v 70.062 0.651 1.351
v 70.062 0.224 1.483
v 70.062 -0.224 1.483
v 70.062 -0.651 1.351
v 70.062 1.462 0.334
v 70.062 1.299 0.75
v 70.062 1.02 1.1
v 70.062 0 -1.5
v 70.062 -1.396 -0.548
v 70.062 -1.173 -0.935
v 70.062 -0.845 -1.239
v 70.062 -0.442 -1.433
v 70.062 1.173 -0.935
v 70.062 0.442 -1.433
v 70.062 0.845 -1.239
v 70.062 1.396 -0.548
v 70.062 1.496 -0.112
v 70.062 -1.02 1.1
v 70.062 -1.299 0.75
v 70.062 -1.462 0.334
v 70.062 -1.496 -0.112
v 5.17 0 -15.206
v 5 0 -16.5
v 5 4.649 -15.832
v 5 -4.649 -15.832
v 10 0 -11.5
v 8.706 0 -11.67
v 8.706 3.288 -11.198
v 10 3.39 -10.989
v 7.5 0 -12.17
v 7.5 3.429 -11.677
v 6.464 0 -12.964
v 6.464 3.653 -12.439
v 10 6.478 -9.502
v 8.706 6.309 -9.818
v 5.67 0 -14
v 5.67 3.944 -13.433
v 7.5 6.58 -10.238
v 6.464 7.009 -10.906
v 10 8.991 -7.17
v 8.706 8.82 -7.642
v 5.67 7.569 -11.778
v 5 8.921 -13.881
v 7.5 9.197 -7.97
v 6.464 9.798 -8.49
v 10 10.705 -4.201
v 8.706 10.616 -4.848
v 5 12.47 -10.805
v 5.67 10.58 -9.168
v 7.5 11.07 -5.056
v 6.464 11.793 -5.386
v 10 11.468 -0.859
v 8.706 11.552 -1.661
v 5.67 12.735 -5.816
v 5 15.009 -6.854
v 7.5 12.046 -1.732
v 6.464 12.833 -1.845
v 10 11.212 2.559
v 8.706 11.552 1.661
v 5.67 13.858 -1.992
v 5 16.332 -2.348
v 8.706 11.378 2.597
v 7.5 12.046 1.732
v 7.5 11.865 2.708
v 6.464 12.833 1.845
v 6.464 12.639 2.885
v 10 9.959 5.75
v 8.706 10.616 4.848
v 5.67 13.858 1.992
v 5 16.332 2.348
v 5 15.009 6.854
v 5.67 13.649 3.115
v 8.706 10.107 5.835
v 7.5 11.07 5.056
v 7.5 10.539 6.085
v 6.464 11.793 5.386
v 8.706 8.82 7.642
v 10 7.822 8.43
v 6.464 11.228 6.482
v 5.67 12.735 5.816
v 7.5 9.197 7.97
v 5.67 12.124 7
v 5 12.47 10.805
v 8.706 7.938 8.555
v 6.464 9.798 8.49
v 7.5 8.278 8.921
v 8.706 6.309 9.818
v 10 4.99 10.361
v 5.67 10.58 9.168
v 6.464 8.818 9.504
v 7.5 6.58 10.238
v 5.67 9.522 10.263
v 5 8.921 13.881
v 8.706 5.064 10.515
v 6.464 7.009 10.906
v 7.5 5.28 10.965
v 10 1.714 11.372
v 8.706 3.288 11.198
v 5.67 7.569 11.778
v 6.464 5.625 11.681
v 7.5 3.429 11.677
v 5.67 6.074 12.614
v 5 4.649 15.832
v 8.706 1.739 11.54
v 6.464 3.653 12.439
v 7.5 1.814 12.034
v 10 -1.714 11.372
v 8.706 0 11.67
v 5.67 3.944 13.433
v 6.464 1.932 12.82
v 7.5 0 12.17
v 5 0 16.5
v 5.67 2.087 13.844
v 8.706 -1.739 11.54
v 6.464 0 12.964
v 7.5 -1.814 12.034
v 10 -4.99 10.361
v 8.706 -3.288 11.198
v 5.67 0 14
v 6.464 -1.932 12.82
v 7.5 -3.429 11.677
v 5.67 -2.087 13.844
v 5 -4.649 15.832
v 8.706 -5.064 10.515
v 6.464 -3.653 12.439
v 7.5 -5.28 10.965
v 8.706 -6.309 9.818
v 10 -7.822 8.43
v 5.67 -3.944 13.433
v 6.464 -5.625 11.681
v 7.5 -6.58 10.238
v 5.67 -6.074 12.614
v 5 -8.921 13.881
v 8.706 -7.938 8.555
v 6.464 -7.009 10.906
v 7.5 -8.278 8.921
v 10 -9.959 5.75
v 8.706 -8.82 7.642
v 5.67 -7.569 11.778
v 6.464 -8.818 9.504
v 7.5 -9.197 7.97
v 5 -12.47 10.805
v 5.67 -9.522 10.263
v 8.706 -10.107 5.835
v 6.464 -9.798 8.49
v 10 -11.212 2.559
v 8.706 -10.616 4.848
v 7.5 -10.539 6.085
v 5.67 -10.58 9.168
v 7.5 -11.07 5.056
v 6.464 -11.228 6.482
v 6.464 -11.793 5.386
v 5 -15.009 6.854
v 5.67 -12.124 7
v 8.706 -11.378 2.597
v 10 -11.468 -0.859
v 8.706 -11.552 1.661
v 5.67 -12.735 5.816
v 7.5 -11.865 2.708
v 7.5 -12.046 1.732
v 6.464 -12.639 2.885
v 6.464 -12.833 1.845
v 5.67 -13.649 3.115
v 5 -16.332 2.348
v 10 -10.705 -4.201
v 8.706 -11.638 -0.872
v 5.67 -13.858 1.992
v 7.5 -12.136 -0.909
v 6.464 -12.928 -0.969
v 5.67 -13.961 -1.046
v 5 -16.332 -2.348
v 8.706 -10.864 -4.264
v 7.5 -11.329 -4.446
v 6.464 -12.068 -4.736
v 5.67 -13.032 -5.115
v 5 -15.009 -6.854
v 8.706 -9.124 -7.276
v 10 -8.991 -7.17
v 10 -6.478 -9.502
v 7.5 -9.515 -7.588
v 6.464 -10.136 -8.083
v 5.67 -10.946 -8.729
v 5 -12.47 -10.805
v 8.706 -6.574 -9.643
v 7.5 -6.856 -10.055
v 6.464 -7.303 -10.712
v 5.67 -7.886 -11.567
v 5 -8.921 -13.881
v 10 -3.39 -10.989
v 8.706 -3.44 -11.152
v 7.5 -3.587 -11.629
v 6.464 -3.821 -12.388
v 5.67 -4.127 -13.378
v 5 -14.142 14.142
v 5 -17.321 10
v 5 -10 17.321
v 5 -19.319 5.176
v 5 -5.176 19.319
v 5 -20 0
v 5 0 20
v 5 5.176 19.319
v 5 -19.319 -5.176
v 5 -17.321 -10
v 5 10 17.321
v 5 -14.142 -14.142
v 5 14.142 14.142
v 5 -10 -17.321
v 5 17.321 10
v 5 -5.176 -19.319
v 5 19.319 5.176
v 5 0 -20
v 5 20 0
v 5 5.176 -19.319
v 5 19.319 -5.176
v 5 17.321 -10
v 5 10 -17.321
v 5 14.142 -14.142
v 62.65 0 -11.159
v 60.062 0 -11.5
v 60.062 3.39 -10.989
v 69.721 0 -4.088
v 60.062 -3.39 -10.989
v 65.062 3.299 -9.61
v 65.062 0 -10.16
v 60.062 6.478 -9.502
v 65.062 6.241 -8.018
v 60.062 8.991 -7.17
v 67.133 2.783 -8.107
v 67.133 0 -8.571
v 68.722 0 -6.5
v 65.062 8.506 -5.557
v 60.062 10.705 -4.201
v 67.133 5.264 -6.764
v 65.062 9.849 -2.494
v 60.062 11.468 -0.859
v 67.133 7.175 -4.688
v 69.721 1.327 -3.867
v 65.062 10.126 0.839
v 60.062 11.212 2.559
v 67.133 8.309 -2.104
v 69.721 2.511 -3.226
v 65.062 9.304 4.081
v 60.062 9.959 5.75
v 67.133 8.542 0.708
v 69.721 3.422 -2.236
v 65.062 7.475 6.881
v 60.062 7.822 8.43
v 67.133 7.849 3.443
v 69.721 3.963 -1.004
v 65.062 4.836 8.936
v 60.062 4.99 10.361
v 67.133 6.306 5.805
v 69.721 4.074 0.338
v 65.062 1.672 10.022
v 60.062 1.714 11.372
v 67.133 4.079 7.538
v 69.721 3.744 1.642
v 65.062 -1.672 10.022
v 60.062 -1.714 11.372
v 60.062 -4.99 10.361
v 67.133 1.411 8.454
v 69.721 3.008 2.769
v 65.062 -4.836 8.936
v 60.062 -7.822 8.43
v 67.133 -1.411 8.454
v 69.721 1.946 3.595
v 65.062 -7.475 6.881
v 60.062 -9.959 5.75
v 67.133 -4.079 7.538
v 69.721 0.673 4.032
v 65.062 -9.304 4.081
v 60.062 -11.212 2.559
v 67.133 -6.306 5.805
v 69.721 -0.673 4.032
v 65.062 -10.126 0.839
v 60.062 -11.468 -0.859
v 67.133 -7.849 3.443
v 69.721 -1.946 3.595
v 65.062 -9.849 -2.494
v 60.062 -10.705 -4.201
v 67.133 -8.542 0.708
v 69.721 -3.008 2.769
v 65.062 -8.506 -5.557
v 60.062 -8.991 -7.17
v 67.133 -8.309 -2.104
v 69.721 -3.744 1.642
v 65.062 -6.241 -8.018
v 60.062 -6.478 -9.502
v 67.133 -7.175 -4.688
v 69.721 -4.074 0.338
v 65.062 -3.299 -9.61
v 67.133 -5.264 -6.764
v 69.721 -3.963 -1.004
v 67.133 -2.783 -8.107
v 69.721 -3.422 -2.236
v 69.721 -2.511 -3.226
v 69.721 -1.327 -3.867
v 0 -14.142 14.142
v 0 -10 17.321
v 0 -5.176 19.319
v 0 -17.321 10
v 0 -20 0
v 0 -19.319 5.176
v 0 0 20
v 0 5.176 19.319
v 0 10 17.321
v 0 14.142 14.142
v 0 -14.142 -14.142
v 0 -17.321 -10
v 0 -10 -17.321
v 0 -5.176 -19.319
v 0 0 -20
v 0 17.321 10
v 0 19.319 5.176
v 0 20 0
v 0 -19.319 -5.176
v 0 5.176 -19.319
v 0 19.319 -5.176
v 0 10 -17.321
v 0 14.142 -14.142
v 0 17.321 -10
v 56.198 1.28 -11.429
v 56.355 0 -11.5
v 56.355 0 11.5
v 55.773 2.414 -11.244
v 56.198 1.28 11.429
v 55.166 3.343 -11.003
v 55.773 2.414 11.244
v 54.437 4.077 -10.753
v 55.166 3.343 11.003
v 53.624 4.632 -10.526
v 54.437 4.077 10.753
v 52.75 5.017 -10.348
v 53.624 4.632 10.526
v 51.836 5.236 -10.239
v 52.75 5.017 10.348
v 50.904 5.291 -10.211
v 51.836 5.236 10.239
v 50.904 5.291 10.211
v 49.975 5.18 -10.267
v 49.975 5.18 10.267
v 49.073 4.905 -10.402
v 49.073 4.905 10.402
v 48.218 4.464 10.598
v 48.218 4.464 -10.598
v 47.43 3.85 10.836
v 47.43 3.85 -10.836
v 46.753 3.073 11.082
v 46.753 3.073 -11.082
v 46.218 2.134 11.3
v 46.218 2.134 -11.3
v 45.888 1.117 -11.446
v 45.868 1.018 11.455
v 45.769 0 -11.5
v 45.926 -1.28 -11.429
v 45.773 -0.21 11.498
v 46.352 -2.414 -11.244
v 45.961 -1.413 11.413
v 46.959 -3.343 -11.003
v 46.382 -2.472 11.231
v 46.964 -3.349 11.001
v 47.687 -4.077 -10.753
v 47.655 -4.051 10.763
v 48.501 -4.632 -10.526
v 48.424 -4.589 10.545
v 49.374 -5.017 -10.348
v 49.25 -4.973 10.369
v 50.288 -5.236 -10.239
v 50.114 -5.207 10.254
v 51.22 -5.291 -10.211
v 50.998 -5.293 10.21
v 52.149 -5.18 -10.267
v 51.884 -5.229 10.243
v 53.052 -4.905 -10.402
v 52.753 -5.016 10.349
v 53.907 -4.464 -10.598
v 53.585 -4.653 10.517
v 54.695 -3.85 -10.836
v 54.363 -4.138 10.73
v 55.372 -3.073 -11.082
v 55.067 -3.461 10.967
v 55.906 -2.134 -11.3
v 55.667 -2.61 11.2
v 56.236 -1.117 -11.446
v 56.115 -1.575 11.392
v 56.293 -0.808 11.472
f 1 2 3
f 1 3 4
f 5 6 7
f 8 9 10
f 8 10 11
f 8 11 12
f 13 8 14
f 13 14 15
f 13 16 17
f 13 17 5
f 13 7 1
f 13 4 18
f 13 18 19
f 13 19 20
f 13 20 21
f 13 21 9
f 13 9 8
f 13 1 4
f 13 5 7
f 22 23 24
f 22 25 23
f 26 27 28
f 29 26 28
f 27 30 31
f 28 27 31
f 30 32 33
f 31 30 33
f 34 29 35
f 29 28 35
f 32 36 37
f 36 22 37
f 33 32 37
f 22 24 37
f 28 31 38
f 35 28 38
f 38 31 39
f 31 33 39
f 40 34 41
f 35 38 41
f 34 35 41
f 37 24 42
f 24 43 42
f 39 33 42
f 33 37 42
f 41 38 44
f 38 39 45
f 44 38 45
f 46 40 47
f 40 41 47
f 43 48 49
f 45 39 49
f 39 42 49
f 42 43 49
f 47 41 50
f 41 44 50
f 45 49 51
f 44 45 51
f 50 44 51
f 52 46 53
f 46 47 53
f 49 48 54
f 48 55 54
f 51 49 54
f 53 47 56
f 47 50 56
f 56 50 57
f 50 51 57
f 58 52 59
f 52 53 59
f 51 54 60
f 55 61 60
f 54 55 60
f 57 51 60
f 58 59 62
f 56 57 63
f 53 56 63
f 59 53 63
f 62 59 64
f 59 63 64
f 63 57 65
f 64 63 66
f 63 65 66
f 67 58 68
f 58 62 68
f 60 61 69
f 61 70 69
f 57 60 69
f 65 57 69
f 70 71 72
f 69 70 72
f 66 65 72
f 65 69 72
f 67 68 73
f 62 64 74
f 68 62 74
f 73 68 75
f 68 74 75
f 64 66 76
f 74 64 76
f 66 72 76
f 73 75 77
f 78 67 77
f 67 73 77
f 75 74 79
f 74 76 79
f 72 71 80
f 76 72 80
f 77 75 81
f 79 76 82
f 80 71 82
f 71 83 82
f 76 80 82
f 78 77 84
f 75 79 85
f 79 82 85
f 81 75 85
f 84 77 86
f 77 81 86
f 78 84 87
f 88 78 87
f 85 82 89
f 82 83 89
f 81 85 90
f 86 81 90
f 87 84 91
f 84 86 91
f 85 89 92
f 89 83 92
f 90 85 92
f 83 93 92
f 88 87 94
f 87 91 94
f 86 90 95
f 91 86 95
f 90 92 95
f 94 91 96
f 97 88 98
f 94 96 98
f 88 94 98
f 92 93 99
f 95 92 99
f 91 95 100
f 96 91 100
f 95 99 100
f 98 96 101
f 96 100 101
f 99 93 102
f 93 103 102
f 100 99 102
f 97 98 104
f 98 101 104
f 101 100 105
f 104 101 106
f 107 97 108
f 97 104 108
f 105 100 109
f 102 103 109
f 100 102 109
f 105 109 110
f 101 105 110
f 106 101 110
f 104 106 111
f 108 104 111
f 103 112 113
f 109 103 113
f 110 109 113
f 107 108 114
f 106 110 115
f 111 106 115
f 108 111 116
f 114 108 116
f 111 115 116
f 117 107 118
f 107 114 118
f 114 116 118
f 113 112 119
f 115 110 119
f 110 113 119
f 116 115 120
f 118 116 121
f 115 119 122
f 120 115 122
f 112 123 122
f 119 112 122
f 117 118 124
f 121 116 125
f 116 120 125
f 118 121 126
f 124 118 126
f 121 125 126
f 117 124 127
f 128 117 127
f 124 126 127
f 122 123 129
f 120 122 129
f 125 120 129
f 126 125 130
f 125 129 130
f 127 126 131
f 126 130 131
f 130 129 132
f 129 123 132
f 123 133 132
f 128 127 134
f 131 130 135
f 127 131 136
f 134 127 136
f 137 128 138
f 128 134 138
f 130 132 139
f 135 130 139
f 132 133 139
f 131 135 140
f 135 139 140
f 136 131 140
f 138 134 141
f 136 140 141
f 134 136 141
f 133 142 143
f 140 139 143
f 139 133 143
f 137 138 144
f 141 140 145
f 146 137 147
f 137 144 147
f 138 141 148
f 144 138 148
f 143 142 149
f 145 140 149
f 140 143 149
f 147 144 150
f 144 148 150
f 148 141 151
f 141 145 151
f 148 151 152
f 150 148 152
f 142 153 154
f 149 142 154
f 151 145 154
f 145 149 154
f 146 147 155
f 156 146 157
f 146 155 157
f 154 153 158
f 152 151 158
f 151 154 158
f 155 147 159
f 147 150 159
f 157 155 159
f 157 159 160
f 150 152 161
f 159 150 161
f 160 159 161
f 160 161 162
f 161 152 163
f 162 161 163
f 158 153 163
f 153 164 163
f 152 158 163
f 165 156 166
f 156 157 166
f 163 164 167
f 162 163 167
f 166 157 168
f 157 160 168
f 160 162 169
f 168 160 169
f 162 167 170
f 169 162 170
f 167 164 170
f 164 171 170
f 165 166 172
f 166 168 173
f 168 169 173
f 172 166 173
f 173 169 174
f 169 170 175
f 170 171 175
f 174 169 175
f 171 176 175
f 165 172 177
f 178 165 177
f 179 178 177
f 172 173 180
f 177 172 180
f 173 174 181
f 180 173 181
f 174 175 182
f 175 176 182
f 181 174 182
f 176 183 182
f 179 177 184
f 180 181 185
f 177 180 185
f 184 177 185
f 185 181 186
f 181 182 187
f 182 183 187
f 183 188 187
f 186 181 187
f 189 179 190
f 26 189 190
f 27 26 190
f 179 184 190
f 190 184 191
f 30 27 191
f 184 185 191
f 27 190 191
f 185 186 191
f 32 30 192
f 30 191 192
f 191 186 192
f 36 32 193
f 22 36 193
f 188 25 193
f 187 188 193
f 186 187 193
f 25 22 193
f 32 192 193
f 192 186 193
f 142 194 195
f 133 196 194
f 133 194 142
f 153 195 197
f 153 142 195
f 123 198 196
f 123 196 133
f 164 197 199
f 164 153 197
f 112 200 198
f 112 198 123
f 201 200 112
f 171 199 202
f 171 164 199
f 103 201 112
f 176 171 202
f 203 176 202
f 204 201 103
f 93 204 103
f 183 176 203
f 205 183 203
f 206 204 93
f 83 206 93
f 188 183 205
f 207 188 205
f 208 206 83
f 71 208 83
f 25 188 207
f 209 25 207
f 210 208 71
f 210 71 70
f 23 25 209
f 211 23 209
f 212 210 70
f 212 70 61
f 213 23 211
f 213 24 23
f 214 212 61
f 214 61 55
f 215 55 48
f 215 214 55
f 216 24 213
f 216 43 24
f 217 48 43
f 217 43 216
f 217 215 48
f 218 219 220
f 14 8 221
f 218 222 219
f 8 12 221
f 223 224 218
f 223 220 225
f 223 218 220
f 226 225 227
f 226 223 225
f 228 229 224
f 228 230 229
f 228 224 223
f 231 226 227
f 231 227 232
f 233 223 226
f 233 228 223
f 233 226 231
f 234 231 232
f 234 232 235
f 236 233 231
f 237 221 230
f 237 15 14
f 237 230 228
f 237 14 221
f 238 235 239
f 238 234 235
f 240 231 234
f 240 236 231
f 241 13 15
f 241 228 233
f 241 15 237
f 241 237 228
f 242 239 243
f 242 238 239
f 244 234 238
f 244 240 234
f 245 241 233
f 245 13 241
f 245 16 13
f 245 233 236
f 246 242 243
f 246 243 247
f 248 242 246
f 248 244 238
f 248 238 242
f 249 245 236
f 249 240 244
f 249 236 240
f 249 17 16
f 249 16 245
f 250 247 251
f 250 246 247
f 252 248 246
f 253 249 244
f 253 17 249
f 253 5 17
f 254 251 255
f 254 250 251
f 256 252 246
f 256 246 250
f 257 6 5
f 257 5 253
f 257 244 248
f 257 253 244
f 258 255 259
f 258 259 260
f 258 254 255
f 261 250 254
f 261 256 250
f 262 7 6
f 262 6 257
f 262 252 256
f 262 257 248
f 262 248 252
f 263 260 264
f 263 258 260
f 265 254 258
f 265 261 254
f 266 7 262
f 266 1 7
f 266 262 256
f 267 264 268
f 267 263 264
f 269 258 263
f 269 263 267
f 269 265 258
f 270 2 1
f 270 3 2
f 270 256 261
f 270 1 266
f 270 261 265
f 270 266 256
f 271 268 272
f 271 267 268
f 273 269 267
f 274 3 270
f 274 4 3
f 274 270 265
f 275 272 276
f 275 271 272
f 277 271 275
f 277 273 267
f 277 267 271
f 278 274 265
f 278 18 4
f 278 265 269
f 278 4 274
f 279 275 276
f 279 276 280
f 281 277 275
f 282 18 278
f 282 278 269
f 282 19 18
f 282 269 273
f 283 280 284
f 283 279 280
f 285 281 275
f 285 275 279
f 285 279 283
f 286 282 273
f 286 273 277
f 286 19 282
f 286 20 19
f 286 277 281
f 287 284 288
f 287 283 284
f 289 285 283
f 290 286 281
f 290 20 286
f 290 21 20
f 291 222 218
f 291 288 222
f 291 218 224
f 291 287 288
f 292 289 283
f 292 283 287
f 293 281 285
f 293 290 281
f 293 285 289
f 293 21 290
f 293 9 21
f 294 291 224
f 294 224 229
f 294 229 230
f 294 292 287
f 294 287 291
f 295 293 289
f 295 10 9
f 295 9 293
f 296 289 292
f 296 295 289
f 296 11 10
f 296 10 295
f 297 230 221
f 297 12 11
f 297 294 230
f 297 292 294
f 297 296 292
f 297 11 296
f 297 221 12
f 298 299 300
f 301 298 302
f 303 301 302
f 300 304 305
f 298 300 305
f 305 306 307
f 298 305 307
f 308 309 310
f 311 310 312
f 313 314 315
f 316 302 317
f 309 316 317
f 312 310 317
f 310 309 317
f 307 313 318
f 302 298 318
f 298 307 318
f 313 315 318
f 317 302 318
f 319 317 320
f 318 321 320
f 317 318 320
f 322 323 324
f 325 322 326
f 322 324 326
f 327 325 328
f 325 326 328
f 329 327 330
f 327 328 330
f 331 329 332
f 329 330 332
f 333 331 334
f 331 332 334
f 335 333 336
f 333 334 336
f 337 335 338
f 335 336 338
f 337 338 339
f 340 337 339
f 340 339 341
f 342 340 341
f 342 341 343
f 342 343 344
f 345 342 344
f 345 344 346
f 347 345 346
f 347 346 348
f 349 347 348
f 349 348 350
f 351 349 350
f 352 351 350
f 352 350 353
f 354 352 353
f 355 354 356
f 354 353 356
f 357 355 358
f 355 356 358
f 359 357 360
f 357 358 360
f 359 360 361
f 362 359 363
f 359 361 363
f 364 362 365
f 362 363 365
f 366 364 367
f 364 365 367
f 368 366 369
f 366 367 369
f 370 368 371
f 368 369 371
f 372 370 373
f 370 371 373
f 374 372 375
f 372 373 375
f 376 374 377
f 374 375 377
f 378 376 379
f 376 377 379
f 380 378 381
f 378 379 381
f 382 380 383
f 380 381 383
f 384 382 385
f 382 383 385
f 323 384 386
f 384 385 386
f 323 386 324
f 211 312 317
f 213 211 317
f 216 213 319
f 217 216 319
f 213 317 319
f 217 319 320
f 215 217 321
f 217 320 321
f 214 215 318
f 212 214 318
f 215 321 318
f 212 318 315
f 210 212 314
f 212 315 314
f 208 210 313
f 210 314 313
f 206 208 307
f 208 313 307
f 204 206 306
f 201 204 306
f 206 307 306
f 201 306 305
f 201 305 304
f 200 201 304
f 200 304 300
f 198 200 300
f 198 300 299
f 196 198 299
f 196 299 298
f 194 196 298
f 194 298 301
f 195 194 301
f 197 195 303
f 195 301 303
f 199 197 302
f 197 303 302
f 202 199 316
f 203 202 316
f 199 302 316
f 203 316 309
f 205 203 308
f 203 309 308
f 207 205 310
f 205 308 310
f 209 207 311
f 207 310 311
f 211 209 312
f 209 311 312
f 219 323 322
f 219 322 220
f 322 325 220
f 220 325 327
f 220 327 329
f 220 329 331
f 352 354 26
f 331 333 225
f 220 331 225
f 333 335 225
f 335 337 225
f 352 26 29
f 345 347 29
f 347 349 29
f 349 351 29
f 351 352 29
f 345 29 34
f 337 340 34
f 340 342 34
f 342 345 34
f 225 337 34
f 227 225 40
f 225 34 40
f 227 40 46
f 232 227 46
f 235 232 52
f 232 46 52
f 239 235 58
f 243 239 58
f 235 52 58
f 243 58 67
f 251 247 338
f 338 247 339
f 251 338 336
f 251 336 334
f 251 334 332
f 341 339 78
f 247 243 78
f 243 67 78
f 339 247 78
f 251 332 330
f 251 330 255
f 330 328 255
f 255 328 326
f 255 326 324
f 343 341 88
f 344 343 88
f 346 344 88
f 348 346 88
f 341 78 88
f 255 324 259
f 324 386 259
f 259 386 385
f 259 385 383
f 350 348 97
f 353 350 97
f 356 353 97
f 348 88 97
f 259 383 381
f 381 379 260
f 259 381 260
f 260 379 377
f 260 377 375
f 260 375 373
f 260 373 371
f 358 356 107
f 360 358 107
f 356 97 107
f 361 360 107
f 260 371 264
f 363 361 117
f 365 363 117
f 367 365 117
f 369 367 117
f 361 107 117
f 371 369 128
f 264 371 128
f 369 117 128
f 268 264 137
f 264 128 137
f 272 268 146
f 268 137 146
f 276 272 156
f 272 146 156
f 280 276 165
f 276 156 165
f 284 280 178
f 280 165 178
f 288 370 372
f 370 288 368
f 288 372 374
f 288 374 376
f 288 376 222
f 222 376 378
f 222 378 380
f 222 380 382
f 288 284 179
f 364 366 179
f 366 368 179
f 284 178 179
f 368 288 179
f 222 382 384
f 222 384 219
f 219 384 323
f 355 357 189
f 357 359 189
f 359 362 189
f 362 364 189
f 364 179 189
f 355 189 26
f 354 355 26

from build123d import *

# Parameters (mm, degrees)
SKETCH2_R           = 20
BOSS_EXTRUDE1_DEPTH = 5
SKETCH3_R           = 11.5
BOSS_EXTRUDE2_DEPTH = 65.062198088
FILLET3_R           = 10
FILLET5_R           = 5
SKETCH6_R           = 5.292916783
CUT_EXTRUDE1_DEPTH  = 85.504906147


with BuildPart() as part:
    # Sketch2 → Boss-Extrude1 (new body)
    with BuildSketch(Plane(origin=(0, 0, 0), x_dir=(0, 0, -1), z_dir=(1, 0, 0))):
        Circle(SKETCH2_R)
    extrude(amount=BOSS_EXTRUDE1_DEPTH)

    # Sketch3 → Boss-Extrude2 (add)
    with BuildSketch(Plane(origin=(5, 0, 0), x_dir=(0, 0, -1), z_dir=(1, 0, 0))):
        Circle(SKETCH3_R)
    extrude(amount=BOSS_EXTRUDE2_DEPTH)

    # Fillet3
    fillet3_edges = [part.edges().sort_by_distance(p)[0] for p in [
        (70.062198088, 0, 11.5),
    ]]
    fillet(fillet3_edges, radius=FILLET3_R)

    # Fillet5
    fillet5_edges = [part.edges().sort_by_distance(p)[0] for p in [
        (5, 0, 11.5),
    ]]
    fillet(fillet5_edges, radius=FILLET5_R)

    # Sketch6 → Cut-Extrude1 (cut, through all)
    with BuildSketch(Plane.XY.offset(22.806162663)):
        with Locations((51.062198088, 0)):
            Circle(SKETCH6_R)
    extrude(amount=-CUT_EXTRUDE1_DEPTH, mode=Mode.SUBTRACT)


solid = part.part
